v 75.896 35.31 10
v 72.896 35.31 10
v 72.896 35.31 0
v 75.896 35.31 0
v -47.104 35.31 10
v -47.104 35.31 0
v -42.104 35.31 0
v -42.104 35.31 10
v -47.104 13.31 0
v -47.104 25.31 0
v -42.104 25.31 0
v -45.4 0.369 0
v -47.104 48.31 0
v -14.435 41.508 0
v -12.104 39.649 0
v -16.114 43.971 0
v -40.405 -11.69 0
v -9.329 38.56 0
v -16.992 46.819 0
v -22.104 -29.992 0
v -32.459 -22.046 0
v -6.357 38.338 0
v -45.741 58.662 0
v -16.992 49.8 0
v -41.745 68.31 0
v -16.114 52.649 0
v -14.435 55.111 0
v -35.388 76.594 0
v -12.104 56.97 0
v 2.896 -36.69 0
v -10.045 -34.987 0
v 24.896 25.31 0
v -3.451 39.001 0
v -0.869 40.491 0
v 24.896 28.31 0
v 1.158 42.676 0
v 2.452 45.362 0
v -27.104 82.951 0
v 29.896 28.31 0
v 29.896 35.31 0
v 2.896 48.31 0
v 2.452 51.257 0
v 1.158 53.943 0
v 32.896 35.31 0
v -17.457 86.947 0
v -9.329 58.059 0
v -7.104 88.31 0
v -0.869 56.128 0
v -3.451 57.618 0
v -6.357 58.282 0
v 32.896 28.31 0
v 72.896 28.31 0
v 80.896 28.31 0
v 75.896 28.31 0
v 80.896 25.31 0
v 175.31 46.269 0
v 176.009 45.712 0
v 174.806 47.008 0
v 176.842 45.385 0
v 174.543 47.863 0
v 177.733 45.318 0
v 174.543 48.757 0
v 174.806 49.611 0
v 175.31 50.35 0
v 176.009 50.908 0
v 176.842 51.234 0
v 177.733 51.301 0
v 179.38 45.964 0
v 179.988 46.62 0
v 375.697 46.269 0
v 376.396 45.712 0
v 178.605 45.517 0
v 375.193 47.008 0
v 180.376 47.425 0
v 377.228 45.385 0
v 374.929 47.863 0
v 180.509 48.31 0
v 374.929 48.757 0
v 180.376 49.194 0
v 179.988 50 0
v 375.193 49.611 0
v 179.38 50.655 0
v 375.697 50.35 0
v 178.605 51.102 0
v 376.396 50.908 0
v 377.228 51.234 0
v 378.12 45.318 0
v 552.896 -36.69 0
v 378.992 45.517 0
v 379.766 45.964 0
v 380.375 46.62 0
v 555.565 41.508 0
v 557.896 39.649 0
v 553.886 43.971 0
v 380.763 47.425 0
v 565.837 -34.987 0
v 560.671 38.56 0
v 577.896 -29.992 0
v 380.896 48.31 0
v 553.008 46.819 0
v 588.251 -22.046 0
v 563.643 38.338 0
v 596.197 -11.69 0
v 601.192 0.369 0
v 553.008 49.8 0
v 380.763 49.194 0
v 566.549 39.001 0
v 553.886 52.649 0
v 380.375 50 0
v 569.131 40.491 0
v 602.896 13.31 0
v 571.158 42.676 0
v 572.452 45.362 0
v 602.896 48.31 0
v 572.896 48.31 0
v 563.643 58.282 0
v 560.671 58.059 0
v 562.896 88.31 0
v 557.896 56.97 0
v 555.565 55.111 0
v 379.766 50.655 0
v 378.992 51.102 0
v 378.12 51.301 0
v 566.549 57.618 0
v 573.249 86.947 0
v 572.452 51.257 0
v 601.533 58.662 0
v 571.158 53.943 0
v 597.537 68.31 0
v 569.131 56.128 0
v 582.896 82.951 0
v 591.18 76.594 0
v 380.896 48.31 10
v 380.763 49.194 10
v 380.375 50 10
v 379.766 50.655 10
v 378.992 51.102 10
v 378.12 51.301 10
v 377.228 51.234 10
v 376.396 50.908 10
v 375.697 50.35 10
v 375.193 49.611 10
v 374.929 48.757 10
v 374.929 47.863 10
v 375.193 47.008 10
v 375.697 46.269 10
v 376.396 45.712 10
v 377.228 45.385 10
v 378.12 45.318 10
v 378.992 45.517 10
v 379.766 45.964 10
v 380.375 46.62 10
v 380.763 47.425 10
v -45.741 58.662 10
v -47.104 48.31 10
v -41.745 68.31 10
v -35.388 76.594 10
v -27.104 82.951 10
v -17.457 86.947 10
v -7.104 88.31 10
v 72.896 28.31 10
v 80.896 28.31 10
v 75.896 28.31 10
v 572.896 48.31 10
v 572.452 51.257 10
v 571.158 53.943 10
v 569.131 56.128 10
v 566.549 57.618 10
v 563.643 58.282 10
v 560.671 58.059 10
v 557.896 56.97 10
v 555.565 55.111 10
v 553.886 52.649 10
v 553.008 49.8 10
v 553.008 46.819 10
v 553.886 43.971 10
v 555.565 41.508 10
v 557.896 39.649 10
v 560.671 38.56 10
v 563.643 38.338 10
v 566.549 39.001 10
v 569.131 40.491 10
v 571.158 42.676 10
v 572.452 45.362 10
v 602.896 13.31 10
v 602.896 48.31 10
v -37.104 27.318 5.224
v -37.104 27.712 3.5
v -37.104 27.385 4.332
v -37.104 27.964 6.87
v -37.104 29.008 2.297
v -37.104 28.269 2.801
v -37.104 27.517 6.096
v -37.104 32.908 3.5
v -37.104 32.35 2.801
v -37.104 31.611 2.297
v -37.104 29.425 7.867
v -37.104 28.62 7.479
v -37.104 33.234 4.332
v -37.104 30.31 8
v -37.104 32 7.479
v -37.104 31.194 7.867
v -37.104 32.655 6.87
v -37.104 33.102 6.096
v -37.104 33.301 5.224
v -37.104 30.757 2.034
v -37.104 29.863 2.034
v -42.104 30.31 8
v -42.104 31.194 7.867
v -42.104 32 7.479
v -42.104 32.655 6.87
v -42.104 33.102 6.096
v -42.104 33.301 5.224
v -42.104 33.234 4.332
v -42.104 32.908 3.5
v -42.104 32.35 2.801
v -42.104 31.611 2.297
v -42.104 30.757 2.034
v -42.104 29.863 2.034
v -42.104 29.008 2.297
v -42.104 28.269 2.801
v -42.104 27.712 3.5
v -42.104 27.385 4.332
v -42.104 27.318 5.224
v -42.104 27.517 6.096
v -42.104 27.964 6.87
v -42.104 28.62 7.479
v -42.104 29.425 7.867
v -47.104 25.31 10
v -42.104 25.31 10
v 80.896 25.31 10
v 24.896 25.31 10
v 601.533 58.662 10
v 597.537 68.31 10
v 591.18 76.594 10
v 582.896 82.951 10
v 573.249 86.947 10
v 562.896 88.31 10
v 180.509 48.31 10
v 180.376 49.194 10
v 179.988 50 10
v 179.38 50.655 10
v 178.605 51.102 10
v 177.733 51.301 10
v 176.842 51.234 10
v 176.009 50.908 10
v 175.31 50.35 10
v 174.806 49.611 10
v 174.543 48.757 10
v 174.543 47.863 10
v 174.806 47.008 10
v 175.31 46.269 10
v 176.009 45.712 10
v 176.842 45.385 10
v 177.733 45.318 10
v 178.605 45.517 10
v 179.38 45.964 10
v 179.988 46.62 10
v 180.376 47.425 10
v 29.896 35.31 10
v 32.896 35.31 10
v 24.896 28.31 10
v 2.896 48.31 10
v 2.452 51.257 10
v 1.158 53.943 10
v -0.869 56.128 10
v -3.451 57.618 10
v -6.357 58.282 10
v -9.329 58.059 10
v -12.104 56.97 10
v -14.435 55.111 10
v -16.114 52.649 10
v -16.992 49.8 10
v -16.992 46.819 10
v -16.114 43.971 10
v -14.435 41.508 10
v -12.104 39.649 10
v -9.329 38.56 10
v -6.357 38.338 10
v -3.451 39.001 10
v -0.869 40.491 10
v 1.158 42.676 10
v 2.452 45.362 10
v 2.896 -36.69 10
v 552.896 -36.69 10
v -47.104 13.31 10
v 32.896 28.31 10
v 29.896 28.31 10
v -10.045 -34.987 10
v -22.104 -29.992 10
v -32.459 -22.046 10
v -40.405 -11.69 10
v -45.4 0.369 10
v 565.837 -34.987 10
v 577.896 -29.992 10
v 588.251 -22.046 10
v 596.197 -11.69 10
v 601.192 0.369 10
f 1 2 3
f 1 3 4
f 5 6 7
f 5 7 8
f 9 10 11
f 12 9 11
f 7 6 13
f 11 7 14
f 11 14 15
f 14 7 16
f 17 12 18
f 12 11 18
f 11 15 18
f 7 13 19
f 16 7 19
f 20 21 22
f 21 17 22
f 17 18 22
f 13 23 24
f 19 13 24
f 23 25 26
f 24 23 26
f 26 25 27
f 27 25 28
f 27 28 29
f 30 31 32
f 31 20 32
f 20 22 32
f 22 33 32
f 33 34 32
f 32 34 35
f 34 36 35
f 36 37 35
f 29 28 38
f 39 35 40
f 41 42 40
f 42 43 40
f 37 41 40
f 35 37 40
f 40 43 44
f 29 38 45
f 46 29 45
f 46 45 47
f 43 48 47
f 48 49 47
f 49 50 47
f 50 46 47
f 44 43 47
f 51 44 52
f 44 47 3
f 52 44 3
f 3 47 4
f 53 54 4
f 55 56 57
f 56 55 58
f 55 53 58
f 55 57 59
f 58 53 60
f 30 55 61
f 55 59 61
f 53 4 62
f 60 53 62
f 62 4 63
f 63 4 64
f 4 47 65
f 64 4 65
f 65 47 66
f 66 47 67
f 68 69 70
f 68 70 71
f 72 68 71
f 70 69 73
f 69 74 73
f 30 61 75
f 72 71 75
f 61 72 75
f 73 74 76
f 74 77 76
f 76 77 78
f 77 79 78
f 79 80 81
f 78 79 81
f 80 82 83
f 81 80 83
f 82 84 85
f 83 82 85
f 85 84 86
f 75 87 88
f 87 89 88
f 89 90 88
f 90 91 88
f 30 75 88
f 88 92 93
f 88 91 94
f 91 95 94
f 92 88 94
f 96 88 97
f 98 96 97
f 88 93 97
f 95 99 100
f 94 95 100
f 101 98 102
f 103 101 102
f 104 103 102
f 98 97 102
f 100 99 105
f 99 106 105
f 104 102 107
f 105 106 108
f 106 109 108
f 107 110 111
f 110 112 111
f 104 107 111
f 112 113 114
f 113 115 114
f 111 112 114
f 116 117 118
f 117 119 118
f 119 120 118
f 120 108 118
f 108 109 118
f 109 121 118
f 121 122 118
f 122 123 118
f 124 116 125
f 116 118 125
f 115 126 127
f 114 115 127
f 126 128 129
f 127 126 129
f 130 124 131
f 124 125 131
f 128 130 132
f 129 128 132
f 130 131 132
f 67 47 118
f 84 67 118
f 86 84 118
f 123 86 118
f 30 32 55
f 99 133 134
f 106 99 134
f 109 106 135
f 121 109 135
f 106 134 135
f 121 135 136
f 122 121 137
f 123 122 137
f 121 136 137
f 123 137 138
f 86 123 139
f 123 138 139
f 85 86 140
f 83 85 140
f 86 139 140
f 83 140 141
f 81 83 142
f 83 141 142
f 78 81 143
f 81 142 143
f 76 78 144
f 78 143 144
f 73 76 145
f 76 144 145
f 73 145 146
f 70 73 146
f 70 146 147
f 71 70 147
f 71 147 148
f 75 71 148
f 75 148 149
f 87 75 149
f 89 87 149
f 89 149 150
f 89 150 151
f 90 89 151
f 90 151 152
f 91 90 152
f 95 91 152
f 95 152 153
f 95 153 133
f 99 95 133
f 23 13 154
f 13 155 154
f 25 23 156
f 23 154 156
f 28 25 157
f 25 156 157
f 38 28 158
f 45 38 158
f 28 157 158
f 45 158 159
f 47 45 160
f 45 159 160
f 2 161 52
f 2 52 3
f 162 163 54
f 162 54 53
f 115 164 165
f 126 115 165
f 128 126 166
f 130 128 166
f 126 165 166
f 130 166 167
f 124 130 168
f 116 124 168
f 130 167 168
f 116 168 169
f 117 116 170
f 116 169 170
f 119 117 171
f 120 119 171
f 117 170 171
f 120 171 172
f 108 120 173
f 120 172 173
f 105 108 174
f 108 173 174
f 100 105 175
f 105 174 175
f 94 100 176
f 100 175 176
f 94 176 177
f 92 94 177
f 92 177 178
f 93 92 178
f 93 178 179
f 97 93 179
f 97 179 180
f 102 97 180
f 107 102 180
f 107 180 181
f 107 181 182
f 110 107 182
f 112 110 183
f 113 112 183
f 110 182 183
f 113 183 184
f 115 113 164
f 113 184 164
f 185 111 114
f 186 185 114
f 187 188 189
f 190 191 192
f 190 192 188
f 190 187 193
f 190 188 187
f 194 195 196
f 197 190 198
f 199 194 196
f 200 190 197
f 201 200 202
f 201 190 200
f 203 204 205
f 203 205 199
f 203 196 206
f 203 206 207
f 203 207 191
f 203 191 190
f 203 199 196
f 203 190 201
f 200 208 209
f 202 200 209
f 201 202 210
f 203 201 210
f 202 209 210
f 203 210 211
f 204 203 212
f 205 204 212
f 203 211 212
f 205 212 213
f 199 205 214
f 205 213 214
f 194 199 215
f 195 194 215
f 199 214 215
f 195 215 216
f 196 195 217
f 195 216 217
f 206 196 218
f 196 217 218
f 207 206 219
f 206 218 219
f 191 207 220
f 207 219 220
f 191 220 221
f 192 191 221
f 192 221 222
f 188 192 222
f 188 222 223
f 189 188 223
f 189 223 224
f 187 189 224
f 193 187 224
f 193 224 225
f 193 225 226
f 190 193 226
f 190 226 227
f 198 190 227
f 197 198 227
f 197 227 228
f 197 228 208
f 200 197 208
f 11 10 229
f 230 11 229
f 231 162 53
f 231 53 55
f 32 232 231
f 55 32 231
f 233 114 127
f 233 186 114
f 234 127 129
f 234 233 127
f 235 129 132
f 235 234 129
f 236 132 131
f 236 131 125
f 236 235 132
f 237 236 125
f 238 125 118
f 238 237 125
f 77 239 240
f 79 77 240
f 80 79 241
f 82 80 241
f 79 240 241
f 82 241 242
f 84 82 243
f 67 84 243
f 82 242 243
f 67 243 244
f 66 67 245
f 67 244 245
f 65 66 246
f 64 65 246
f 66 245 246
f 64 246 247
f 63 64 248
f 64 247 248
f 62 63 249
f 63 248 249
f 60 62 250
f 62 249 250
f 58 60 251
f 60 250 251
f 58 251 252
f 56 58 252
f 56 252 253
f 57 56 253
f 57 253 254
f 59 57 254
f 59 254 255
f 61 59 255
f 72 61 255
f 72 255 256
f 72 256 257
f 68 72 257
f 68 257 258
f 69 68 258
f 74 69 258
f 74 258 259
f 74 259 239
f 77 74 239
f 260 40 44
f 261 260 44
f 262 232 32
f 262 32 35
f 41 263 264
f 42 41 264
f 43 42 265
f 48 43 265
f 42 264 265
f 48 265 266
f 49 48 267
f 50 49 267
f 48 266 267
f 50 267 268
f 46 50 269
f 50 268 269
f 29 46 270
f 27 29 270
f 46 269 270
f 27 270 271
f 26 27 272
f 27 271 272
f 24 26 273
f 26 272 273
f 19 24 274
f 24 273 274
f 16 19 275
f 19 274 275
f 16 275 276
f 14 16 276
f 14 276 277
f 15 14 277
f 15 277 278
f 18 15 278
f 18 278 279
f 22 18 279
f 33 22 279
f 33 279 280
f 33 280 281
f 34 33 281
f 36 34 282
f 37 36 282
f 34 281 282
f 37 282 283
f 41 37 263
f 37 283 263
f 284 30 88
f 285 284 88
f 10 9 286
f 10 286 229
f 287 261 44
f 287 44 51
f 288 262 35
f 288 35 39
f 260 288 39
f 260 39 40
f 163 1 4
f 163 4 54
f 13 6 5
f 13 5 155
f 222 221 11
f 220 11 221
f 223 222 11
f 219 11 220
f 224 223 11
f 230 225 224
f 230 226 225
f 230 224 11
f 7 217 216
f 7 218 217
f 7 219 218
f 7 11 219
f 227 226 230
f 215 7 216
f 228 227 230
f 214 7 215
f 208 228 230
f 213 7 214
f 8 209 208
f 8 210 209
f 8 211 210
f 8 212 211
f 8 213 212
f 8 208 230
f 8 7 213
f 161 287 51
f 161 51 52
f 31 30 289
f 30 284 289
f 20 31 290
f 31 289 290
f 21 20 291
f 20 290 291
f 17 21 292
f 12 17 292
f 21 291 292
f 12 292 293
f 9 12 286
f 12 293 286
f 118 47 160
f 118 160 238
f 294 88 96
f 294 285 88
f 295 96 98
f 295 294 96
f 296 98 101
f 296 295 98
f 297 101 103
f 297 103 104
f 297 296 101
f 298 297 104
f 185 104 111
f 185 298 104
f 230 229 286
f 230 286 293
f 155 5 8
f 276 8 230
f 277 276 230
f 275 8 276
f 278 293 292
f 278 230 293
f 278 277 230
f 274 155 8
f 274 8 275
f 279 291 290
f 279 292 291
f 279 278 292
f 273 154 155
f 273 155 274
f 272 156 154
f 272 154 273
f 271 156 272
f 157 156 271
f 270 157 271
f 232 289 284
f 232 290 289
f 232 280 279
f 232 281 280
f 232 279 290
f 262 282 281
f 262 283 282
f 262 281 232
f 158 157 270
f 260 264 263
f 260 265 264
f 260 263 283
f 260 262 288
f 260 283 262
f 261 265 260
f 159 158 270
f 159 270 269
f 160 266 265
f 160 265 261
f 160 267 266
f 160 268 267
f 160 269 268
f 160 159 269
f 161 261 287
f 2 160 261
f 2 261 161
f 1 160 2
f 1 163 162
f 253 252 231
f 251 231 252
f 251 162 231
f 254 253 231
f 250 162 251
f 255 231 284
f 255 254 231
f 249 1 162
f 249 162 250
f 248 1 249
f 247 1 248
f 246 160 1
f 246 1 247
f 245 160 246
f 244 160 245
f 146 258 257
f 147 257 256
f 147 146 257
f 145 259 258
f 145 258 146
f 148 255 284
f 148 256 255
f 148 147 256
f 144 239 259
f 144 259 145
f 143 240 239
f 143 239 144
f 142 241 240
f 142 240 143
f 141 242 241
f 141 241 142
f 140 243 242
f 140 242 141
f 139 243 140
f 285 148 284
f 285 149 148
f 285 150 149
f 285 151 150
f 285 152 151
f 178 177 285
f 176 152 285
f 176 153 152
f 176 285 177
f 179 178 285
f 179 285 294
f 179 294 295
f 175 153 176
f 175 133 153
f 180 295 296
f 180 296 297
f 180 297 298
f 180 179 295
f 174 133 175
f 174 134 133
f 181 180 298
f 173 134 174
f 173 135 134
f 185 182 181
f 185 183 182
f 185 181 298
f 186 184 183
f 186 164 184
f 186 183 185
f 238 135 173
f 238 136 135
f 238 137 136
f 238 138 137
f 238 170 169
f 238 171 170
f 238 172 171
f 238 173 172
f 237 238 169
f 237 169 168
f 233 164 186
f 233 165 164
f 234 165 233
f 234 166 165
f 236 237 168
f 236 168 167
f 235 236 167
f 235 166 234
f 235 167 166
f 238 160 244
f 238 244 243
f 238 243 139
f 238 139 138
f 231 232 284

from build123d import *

# Parameters (mm, degrees)
SKETCH1_W           = 650
SKETCH1_H           = 125
BOSS_EXTRUDE1_DEPTH = 10
SKETCH2_R           = 10
CUT_EXTRUDE2_DEPTH  = 10
SKETCH3_R           = 10
CUT_EXTRUDE3_DEPTH  = 10
BOSS_EXTRUDE3_DEPTH = 20
SKETCH5_W           = 26
SKETCH5_H           = 3
CUT_EXTRUDE4_DEPTH  = 20
BOSS_EXTRUDE4_DEPTH = 20
SKETCH8_R           = 3
CUT_EXTRUDE5_DEPTH  = 20
FILLET1_R           = 50
FILLET2_R           = 40
FILLET3_R           = 50
FILLET4_R           = 40
SKETCH9_R           = 3
CUT_EXTRUDE6_DEPTH  = 10
SKETCH10_W          = 10
SKETCH10_H          = 10
CUT_EXTRUDE7_DEPTH  = 5
CUT_EXTRUDE8_DEPTH  = 30
SKETCH12_W          = 133
SKETCH12_H          = 20
CUT_EXTRUDE9_DEPTH  = 100
SKETCH13_W          = 20
SKETCH13_H          = 36
CUT_EXTRUDE10_DEPTH = 100


with BuildPart() as part:
    # Sketch1 → Boss-Extrude1 (new body)
    with BuildSketch(Plane.XY):
        with Locations((277.89592831, 25.809681948)):
            Rectangle(SKETCH1_W, SKETCH1_H)
    extrude(amount=BOSS_EXTRUDE1_DEPTH)

    # Sketch2 → Cut-Extrude2 (cut)
    with BuildSketch(Plane.XY.offset(10)):
        with Locations((-7.10407169, 48.309681948)):
            Circle(SKETCH2_R)
    extrude(amount=-CUT_EXTRUDE2_DEPTH, mode=Mode.SUBTRACT)

    # Sketch3 → Cut-Extrude3 (cut)
    with BuildSketch(Plane.XY.offset(10)):
        with Locations((562.89592831, 48.309681948)):
            Circle(SKETCH3_R)
    extrude(amount=-CUT_EXTRUDE3_DEPTH, mode=Mode.SUBTRACT)

    # Sketch4 → Boss-Extrude3 (add)
    with BuildSketch(Plane.XY.offset(10)):
        Polygon((32.89592831, 68.309681948), (72.89592831, 68.309681948), (72.89592831, 28.309681948), (32.89592831, 28.309681948), (32.89592831, 35.309681948), (29.89592831, 35.309681948), (29.89592831, 25.309681948), (75.89592831, 25.309681948), (75.89592831, 71.309681948), (29.89592831, 71.309681948), (29.89592831, 61.309681948), (32.89592831, 61.309681948), align=None)
    extrude(amount=BOSS_EXTRUDE3_DEPTH)

    # Sketch5 → Cut-Extrude4 (cut)
    with BuildSketch(Plane.XY.offset(30)):
        with Locations((52.89592831, 69.809681948)):
            Rectangle(SKETCH5_W, SKETCH5_H)
    extrude(amount=-CUT_EXTRUDE4_DEPTH, mode=Mode.SUBTRACT)

    # Sketch7 → Boss-Extrude4 (add)
    with BuildSketch(Plane.XY.offset(10)):
        Polygon((527.89592831, -36.690318052), (463.89592831, -36.690318052), (463.89592831, 25.309681948), (465.89592831, 25.309681948), (465.89592831, -34.690318052), (525.89592831, -34.690318052), (525.89592831, 25.309681948), (527.89592831, 25.309681948), align=None)
        Polygon((458.89592831, 25.309681948), (458.89592831, -36.690318052), (394.89592831, -36.690318052), (394.89592831, 25.309681948), (396.89592831, 25.309681948), (396.89592831, -34.690318052), (456.89592831, -34.690318052), (456.89592831, 25.309681948), align=None)
    extrude(amount=BOSS_EXTRUDE4_DEPTH)

    # Sketch8 → Cut-Extrude5 (cut)
    with BuildSketch(Plane.XY.offset(10)):
        with Locations((177.509070801, 48.309681948)):
            Circle(SKETCH8_R)
        with Locations((377.89592831, 48.309681948)):
            Circle(SKETCH8_R)
    extrude(amount=-CUT_EXTRUDE5_DEPTH, mode=Mode.SUBTRACT)

    # Fillet1
    fillet1_edges = [part.edges().sort_by_distance(p)[0] for p in [
        (602.89592831, -36.690318052, 5),
    ]]
    fillet(fillet1_edges, radius=FILLET1_R)

    # Fillet2
    fillet2_edges = [part.edges().sort_by_distance(p)[0] for p in [
        (602.89592831, 88.309681948, 5),
    ]]
    fillet(fillet2_edges, radius=FILLET2_R)

    # Fillet3
    fillet3_edges = [part.edges().sort_by_distance(p)[0] for p in [
        (-47.10407169, -36.690318052, 5),
    ]]
    fillet(fillet3_edges, radius=FILLET3_R)

    # Fillet4
    fillet4_edges = [part.edges().sort_by_distance(p)[0] for p in [
        (-47.10407169, 88.309681948, 5),
    ]]
    fillet(fillet4_edges, radius=FILLET4_R)

    # Sketch9 → Cut-Extrude6 (cut)
    with BuildSketch(Plane.ZY.offset(47.10407169)):
        with Locations((5, 30.309681948)):
            Circle(SKETCH9_R)
    extrude(amount=-CUT_EXTRUDE6_DEPTH, mode=Mode.SUBTRACT)

    # Sketch10 → Cut-Extrude7 (cut)
    with BuildSketch(Plane.ZY.offset(47.10407169)):
        with Locations((5, 30.309681948)):
            Rectangle(SKETCH10_W, SKETCH10_H)
    extrude(amount=-CUT_EXTRUDE7_DEPTH, mode=Mode.SUBTRACT)

    # Sketch11 → Cut-Extrude8 (cut)
    with BuildSketch(Plane.XY.offset(30)):
        Polygon((29.89592831, 35.309681948), (32.89592831, 35.309681948), (32.89592831, 28.309681948), (72.89592831, 28.309681948), (72.89592831, 35.309681948), (75.89592831, 35.309681948), (75.89592831, 28.309681948), (80.89592831, 28.309681948), (80.89592831, 25.309681948), (75.89592831, 25.309681948), (29.89592831, 25.309681948), (24.89592831, 25.309681948), (24.89592831, 28.309681948), (29.89592831, 28.309681948), align=None)
    extrude(amount=-CUT_EXTRUDE8_DEPTH, mode=Mode.SUBTRACT)

    # Sketch12 → Cut-Extrude9 (cut)
    with BuildSketch(Plane.XZ.offset(36.690318052)):
        with Locations((461.39592831, 20)):
            Rectangle(SKETCH12_W, SKETCH12_H)
    extrude(amount=-CUT_EXTRUDE9_DEPTH, mode=Mode.SUBTRACT)

    # Sketch13 → Cut-Extrude10 (cut)
    with BuildSketch(Plane(origin=(75.89592831, 0, 0), x_dir=(0, 0, -1), z_dir=(1, 0, 0))):
        with Locations((-20, 53.309681948)):
            Rectangle(SKETCH13_W, SKETCH13_H)
    extrude(amount=-CUT_EXTRUDE10_DEPTH, mode=Mode.SUBTRACT)


solid = part.part
